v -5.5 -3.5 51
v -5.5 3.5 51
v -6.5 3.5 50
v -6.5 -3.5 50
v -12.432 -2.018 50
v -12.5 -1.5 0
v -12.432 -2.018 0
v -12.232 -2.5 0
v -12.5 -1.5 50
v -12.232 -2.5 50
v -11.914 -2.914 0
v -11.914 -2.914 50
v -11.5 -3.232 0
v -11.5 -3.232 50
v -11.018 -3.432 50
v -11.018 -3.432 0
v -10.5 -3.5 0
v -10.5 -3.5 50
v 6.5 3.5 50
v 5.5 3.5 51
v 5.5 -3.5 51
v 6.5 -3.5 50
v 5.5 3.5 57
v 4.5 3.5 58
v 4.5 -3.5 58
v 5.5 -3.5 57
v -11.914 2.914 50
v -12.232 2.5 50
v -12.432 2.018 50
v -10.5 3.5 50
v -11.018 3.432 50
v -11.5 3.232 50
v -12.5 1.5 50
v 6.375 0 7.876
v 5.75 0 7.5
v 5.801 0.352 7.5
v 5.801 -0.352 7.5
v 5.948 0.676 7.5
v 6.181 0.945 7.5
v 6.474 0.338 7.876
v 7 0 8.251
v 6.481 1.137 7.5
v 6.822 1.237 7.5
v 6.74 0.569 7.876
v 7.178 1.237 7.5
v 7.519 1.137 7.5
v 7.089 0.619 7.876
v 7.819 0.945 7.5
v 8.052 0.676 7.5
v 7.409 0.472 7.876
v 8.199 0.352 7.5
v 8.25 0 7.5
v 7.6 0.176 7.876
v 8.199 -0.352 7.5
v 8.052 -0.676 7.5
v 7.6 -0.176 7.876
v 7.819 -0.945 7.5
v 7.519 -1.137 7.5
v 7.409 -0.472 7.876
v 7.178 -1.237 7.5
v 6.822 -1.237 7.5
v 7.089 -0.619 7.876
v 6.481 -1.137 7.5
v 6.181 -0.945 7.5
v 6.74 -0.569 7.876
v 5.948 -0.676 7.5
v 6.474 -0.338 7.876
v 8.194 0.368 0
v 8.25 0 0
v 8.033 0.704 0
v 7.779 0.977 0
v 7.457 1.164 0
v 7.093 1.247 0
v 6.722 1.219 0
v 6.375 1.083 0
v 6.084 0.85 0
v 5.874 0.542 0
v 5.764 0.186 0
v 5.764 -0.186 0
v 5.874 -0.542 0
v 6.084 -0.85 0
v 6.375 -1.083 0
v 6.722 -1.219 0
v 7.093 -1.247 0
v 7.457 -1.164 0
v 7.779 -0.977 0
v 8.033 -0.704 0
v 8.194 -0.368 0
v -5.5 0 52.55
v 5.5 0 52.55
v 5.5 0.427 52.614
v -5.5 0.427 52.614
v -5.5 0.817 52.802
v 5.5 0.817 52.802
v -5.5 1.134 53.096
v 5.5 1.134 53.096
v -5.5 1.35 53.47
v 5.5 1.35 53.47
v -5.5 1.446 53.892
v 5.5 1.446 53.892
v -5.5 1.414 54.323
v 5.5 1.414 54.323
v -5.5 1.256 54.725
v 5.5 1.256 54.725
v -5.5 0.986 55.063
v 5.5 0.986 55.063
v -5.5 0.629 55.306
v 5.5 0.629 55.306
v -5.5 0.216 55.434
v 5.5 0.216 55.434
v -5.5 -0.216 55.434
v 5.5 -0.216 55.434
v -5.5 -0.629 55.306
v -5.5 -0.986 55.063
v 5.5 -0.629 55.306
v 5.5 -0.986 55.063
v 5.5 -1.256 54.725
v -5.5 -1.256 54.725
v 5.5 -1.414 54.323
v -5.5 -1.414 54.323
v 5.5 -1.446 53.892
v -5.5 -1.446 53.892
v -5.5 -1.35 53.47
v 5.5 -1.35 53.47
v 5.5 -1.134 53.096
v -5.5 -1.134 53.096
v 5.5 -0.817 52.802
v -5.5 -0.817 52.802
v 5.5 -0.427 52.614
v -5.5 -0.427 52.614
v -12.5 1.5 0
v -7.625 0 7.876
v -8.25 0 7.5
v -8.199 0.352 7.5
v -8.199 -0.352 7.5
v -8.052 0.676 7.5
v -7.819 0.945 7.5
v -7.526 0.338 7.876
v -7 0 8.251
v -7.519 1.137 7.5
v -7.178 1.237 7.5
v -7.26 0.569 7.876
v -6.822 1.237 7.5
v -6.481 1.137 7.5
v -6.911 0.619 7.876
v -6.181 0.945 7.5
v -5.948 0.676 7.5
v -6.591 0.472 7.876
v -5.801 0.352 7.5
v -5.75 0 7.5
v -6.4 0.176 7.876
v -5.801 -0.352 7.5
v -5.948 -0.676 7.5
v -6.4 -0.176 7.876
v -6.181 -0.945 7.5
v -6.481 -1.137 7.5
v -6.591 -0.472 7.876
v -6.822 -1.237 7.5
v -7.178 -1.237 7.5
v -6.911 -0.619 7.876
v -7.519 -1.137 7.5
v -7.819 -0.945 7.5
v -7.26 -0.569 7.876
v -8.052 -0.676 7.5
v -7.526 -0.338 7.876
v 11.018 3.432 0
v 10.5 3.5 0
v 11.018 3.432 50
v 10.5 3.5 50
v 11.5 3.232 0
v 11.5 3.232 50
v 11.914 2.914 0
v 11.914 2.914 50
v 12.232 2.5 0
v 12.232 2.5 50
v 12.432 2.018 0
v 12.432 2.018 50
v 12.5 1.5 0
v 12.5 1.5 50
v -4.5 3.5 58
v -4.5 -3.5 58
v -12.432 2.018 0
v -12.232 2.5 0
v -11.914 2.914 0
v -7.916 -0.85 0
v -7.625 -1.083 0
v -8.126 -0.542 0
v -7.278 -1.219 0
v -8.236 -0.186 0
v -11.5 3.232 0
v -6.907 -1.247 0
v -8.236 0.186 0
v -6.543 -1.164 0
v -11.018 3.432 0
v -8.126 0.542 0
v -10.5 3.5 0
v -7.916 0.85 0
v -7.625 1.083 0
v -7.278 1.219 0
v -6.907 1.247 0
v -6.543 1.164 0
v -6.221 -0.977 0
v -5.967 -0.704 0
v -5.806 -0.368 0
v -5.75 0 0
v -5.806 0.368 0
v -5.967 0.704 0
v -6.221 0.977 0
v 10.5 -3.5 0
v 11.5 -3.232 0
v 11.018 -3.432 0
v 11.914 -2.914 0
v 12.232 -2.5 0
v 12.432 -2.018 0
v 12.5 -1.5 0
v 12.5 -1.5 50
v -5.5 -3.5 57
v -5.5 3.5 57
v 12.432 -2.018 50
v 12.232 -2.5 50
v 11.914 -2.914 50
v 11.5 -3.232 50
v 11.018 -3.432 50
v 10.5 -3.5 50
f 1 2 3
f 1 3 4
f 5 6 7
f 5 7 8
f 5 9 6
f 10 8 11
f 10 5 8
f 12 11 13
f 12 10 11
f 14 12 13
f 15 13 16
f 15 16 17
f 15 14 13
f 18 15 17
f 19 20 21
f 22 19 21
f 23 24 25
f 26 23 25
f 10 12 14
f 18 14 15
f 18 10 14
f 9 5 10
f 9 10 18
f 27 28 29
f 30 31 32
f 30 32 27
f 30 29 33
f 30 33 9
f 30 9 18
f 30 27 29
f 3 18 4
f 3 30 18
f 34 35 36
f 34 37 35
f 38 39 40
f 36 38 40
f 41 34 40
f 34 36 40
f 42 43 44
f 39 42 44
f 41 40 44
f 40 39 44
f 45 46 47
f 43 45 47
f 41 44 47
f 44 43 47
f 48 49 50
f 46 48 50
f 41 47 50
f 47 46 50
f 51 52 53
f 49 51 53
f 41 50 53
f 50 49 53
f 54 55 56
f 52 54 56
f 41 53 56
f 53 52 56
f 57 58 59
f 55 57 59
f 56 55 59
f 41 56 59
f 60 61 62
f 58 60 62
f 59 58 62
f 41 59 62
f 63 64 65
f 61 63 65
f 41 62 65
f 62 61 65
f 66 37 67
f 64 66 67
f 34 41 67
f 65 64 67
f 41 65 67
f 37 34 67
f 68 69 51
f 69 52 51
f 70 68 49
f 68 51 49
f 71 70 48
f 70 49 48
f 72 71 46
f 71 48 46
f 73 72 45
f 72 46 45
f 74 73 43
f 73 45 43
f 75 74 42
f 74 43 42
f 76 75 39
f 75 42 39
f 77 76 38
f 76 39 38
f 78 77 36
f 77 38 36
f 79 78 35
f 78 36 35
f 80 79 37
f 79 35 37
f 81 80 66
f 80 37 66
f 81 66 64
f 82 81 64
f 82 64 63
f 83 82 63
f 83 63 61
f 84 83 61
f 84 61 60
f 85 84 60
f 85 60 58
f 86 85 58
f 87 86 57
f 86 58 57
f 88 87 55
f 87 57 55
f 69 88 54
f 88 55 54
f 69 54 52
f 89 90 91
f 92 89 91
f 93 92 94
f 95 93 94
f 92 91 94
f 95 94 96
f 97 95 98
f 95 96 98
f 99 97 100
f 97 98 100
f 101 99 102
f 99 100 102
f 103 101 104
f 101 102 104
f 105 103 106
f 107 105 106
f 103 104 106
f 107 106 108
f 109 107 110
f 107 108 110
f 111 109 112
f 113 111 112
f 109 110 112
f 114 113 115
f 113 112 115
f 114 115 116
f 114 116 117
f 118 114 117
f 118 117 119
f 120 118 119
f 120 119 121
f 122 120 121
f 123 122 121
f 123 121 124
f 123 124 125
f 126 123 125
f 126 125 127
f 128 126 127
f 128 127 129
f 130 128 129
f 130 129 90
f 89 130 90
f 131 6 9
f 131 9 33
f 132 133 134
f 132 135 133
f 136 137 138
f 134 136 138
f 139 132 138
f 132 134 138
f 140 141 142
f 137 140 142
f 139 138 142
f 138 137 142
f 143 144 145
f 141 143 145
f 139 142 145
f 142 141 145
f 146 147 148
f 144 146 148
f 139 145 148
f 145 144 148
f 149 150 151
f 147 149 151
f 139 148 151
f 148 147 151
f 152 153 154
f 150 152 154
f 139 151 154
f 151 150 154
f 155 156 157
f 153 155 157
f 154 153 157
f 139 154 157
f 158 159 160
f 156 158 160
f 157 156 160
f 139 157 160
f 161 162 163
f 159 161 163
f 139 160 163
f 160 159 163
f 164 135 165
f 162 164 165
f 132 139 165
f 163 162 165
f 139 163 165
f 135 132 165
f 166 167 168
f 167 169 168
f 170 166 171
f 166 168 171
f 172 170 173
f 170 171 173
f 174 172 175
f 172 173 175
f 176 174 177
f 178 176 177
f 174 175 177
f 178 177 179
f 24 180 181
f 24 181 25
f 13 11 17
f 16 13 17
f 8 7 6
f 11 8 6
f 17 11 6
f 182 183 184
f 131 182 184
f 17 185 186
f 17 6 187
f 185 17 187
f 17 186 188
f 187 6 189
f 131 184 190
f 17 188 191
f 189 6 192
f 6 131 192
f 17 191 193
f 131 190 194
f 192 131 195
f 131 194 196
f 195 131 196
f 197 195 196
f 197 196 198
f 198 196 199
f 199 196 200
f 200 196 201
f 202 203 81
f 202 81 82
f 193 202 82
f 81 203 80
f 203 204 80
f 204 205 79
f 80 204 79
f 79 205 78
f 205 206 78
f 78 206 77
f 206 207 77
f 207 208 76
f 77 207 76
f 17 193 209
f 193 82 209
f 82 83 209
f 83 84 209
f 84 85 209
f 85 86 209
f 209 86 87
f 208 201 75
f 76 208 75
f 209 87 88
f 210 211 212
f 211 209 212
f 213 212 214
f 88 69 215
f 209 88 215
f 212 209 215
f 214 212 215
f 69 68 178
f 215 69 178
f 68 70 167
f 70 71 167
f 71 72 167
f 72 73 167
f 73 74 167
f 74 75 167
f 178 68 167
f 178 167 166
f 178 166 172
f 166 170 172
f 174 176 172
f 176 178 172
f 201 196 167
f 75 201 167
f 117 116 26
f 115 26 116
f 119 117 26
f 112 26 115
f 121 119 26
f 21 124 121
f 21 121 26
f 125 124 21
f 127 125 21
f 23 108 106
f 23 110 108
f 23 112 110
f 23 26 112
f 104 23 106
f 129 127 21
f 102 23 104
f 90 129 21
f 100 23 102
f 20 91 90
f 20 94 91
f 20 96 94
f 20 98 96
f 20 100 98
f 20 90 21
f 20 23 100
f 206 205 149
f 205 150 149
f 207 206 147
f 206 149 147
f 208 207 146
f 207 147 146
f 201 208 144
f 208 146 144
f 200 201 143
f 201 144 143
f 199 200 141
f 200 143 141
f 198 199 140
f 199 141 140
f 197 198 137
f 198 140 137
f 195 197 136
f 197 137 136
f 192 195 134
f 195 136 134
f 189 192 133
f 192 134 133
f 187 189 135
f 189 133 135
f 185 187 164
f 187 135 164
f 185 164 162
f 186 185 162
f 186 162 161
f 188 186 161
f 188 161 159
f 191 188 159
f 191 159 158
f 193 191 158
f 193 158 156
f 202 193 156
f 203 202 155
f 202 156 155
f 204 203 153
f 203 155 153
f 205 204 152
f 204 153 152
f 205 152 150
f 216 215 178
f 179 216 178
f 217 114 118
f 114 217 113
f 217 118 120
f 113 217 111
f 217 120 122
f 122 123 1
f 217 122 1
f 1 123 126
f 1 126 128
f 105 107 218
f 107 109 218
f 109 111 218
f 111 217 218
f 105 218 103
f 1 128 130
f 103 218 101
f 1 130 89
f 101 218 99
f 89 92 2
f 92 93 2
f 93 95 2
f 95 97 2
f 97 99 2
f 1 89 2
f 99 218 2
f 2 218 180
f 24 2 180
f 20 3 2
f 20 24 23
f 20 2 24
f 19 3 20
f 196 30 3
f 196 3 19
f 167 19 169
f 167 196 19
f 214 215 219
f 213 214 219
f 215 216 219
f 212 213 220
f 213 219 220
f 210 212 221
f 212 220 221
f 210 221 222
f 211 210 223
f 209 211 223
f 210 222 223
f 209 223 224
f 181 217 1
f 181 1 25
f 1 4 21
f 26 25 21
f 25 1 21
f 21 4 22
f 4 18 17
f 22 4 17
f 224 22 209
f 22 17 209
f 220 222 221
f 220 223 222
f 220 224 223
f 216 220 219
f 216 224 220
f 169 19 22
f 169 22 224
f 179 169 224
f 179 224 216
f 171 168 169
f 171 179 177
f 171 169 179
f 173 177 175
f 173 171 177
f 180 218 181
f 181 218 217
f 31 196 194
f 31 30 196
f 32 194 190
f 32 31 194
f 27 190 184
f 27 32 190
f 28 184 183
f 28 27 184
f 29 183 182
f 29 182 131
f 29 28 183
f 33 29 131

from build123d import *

# Parameters (mm, degrees)
SKETCH1_W                 = 25
SKETCH1_H                 = 7
BOSS_EXTRUDE1_DEPTH       = 58
SKETCH2_W                 = 7
SKETCH2_H                 = 8
CUT_EXTRUDE1_DEPTH        = 60.74320045
M3X0_5_TAPPED_HOLE2_D     = 2.5
M3X0_5_TAPPED_HOLE2_DEPTH = 7.5
M3X0_5_TAPPED_HOLE2_TIP   = 0.751075774
CHAMFER1_SIZE             = 1
M2_5_CLEARANCE_HOLE1_D    = 2.9
FILLET1_R                 = 2
CHAMFER2_SIZE             = 1


with BuildPart() as part:
    # Sketch1 → Boss-Extrude1 (new body)
    with BuildSketch(Plane.XY):
        Rectangle(SKETCH1_W, SKETCH1_H)
    extrude(amount=BOSS_EXTRUDE1_DEPTH)

    # Sketch2 → Cut-Extrude1 (cut, through all)
    with BuildSketch(Plane(origin=(0, 3.5, 0), x_dir=(1, 0, 0), z_dir=(0, 1, 0))):
        with Locations((-9, -54)):
            Rectangle(SKETCH2_W, SKETCH2_H)
        with Locations((9, -54)):
            Rectangle(SKETCH2_W, SKETCH2_H)
    extrude(amount=-CUT_EXTRUDE1_DEPTH, mode=Mode.SUBTRACT)

    # M3x0.5 Tapped Hole2
    with Locations(Plane(origin=(0, 0, 0), x_dir=(-1, 0, 0), z_dir=(0, 0, -1))):
        with Locations((-7, 0), (7, 0)):
            Hole(M3X0_5_TAPPED_HOLE2_D / 2, depth=M3X0_5_TAPPED_HOLE2_DEPTH)
            with Locations((0, 0, -(M3X0_5_TAPPED_HOLE2_DEPTH + M3X0_5_TAPPED_HOLE2_TIP / 2))):  # 118° drill point
                Cone(0, M3X0_5_TAPPED_HOLE2_D / 2, M3X0_5_TAPPED_HOLE2_TIP, mode=Mode.SUBTRACT)

    # Chamfer1
    chamfer1_edges = [part.edges().sort_by_distance(p)[0] for p in [
        (-5.5, 0, 58),
        (5.5, 0, 58),
    ]]
    chamfer(chamfer1_edges, length=CHAMFER1_SIZE)

    # M2.5 Clearance Hole1 (through all)
    with Locations(Plane(origin=(-5.5, -6.575007997, -1.706532938), x_dir=(0, 0, 1), z_dir=(-1, 0, 0))):
        with Locations((55.706532938, 6.575007997)):
            Hole(M2_5_CLEARANCE_HOLE1_D / 2)

    # Fillet1
    fillet1_edges = [part.edges().sort_by_distance(p)[0] for p in [
        (-12.5, -3.5, 25),
        (-12.5, 3.5, 25),
        (12.5, -3.5, 25),
        (12.5, 3.5, 25),
    ]]
    fillet(fillet1_edges, radius=FILLET1_R)

    # Chamfer2
    chamfer2_edges = [part.edges().sort_by_distance(p)[0] for p in [
        (-5.5, 0, 50),
        (5.5, 0, 50),
    ]]
    chamfer(chamfer2_edges, length=CHAMFER2_SIZE)


solid = part.part
